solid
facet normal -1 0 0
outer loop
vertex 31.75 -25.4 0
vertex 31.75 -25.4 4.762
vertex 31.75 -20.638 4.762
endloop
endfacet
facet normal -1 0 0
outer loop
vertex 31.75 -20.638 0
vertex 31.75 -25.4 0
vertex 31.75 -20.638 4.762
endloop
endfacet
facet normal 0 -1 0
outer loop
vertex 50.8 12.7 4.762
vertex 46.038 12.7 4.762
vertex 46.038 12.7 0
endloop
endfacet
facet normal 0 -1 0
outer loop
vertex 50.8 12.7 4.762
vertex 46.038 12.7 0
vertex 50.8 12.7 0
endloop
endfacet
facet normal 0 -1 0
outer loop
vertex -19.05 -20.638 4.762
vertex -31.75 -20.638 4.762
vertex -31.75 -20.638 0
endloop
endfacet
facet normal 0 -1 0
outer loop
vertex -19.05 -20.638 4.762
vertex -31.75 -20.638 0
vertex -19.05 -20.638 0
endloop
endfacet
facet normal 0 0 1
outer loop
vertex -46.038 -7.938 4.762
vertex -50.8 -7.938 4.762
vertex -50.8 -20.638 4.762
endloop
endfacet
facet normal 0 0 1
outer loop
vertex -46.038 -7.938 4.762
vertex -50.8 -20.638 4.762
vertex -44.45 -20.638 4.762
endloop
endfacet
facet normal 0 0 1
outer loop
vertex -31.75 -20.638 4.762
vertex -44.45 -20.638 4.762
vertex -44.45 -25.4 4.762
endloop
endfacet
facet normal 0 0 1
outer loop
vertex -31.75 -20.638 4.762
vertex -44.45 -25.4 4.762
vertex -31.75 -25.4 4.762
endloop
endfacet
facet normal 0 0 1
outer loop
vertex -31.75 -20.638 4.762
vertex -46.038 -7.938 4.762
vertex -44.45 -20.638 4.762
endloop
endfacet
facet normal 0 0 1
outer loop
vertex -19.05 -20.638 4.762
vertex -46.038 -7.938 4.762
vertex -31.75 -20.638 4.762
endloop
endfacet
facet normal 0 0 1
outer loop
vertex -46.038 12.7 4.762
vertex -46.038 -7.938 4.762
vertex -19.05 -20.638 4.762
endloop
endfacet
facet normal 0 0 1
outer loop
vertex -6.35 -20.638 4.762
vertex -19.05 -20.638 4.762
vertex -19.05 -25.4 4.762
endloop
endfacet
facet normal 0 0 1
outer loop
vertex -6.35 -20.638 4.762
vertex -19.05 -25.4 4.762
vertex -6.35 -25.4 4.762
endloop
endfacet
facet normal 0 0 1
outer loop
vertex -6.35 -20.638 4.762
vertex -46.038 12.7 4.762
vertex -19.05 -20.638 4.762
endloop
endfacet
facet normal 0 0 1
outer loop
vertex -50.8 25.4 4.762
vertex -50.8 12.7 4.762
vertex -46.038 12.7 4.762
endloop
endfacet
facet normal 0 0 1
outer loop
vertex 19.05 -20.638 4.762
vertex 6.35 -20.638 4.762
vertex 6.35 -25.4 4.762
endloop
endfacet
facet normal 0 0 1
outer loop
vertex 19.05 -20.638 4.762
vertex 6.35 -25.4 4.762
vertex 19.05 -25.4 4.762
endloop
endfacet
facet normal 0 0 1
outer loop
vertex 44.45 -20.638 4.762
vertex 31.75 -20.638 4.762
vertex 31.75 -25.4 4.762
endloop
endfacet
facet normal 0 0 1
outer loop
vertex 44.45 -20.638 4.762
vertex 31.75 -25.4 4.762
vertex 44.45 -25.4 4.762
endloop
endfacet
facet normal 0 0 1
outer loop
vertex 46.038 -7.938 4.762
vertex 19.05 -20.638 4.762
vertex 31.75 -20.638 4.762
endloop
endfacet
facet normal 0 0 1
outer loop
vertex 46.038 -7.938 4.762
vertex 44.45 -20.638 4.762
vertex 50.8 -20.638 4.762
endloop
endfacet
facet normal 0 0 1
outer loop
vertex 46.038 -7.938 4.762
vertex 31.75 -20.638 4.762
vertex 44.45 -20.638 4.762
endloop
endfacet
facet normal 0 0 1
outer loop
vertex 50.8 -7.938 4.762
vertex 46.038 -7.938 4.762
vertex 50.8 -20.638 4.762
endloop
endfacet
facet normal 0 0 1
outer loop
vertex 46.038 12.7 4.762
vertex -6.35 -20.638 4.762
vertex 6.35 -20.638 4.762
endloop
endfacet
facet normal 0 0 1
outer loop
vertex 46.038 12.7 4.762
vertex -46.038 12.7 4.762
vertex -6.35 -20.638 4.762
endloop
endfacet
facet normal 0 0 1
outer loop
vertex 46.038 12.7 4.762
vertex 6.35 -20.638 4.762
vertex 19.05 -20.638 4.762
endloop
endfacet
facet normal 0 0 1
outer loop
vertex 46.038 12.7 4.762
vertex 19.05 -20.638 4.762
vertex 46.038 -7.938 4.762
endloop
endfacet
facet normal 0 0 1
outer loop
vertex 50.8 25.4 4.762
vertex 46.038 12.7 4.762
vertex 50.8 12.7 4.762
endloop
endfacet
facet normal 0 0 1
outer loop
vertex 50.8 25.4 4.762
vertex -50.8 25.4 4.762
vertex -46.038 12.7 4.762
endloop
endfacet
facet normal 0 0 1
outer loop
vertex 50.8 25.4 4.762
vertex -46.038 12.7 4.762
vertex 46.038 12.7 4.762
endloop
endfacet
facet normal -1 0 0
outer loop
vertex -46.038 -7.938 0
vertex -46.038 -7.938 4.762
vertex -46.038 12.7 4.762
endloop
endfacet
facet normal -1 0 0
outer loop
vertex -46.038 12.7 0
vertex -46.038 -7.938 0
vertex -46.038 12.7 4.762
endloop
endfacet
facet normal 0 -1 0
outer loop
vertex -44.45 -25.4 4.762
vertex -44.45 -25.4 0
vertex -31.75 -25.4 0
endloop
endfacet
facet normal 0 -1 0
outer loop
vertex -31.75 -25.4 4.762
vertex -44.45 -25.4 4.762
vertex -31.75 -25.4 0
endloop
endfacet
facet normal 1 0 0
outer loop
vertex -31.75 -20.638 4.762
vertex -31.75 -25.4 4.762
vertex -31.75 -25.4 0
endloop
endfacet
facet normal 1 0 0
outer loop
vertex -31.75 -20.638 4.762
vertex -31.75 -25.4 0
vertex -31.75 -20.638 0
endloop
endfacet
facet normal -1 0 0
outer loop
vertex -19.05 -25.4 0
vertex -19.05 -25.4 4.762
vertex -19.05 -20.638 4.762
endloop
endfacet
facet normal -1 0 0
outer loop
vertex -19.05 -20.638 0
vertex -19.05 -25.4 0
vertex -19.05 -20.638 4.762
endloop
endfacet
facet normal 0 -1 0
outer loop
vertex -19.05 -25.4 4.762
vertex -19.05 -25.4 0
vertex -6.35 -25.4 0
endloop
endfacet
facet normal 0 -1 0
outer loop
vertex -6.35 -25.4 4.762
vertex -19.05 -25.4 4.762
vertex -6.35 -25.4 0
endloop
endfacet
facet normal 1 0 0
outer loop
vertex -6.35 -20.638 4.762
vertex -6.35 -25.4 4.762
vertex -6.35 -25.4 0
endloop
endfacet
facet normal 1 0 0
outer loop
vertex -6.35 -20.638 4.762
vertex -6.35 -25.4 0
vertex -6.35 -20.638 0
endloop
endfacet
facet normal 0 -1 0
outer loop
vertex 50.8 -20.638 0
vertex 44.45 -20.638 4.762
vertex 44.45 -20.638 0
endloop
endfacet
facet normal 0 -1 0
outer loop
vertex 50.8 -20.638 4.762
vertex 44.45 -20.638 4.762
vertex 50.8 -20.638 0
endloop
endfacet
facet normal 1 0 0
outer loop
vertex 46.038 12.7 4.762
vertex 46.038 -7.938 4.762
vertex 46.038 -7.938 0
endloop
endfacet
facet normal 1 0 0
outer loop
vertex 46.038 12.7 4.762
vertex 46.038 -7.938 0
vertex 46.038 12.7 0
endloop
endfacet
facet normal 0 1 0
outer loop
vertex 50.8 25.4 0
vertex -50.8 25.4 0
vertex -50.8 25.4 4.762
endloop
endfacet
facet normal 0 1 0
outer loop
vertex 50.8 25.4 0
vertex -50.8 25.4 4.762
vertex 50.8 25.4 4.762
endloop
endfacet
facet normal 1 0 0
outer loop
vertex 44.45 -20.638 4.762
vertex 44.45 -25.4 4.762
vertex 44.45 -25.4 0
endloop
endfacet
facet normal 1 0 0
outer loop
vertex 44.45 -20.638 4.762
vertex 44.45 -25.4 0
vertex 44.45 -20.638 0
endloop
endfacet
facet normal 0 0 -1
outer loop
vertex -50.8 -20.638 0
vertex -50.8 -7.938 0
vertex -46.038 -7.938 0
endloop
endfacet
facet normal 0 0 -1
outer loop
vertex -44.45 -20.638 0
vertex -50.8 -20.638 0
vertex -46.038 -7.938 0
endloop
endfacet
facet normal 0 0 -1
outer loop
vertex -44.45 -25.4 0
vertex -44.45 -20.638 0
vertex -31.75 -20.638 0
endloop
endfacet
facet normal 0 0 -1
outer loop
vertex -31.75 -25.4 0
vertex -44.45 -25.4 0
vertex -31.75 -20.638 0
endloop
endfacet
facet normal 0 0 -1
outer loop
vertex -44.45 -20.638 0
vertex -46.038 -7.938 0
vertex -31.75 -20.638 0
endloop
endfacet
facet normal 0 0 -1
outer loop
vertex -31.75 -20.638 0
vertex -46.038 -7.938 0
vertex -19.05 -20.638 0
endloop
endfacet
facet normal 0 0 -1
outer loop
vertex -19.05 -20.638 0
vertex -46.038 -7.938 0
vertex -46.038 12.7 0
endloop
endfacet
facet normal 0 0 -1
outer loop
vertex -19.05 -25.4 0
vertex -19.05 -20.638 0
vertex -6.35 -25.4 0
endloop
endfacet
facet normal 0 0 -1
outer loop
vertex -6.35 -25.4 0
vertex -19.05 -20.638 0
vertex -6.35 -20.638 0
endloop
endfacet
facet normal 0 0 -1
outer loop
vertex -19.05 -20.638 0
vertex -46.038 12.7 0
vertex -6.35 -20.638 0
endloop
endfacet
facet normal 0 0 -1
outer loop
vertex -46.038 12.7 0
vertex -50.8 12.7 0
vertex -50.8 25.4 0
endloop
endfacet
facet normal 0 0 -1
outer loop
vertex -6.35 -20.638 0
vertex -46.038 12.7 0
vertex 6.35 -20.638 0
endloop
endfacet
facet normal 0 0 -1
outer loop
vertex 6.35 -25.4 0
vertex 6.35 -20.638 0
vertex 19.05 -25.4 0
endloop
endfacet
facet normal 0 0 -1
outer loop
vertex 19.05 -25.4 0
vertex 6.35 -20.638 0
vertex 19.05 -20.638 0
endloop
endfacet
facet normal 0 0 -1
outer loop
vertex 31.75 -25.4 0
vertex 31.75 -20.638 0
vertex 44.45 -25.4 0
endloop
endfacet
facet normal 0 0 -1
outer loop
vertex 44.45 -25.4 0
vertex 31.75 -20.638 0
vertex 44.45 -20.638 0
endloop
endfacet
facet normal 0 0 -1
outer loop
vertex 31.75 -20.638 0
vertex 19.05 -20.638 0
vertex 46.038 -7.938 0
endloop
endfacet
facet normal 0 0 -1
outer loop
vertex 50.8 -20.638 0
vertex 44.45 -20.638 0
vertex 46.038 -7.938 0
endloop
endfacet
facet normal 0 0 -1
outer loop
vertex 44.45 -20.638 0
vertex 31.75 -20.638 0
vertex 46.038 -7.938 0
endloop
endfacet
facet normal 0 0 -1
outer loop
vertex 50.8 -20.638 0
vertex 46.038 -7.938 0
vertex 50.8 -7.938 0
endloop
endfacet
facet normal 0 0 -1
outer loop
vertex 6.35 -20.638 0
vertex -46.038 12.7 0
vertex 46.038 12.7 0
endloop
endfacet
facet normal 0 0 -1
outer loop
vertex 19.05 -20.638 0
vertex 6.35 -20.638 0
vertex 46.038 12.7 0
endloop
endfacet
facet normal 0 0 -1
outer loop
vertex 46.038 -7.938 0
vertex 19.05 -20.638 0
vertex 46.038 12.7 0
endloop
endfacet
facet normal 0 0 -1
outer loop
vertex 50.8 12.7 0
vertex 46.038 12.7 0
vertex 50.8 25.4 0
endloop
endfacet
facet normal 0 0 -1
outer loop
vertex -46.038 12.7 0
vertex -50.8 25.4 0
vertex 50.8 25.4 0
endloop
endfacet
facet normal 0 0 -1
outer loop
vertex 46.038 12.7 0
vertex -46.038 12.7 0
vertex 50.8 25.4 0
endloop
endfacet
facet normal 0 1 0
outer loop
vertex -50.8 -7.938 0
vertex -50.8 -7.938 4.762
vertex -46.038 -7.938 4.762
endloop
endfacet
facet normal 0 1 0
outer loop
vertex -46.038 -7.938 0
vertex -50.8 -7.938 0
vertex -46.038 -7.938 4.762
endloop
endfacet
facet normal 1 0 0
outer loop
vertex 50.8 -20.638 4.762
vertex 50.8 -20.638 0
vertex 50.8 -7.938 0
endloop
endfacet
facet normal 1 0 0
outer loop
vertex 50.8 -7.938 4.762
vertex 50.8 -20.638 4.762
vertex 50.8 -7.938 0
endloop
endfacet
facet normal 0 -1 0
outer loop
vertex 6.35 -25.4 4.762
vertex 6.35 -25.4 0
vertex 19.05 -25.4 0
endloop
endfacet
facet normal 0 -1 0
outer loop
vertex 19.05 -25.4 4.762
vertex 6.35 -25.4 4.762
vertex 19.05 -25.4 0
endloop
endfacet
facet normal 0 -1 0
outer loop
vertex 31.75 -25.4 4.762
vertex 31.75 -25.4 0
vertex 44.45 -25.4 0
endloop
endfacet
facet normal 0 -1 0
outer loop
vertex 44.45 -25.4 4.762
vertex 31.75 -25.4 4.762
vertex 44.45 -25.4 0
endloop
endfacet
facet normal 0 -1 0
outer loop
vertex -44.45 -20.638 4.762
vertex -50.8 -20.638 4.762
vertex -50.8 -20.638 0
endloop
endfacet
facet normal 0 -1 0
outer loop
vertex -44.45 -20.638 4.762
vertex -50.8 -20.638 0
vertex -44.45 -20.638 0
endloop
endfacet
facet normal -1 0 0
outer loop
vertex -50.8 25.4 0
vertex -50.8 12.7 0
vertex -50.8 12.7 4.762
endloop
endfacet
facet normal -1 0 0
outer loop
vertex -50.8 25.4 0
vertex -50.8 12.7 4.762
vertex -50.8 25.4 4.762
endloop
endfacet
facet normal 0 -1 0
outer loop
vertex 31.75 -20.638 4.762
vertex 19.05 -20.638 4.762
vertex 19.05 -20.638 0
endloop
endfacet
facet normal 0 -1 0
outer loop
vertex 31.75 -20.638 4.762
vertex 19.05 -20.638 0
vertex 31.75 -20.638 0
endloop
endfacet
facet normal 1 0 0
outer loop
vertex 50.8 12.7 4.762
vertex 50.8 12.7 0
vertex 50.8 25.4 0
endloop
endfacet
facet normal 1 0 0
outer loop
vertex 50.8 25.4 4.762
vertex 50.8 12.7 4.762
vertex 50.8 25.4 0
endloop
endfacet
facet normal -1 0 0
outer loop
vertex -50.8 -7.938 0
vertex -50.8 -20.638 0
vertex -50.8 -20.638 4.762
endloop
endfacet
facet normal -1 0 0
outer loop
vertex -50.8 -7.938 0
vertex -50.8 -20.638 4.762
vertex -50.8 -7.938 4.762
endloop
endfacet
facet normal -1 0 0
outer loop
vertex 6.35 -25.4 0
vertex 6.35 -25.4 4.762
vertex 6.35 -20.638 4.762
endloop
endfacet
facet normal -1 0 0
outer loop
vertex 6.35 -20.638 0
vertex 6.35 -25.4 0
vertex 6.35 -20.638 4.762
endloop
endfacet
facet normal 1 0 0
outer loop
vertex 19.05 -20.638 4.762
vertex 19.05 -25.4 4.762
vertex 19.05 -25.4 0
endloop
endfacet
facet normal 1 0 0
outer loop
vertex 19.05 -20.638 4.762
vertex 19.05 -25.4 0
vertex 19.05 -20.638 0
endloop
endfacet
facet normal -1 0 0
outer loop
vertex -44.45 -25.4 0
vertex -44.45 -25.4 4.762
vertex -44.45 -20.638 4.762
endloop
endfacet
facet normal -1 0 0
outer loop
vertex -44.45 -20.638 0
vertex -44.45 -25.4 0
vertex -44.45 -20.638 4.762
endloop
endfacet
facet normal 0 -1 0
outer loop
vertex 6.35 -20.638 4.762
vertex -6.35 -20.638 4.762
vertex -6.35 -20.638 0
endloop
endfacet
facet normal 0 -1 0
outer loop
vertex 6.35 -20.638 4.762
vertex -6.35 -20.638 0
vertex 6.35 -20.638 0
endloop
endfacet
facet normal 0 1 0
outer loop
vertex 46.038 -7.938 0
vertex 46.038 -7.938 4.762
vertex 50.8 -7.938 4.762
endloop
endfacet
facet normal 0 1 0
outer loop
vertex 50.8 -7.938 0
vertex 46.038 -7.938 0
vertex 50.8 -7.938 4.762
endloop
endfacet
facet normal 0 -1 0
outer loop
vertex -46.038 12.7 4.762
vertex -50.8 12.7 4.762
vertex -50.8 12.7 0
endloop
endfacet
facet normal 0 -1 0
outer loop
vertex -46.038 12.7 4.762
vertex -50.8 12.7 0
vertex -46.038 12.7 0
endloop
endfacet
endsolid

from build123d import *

# Parameters (mm, degrees)
F0_W     = 101.6
F0_H     = 50.8
F1_DEPTH = 4.7625
F2_W     = 6.35
F2_H     = 4.7625
F2_W_2   = 12.7
F3_DEPTH = 25.4
F4_W     = 4.7625
F4_H     = 20.6375
F5_DEPTH = 25.4


with BuildPart() as f1:
    # F0 (on Top) → F1 (new body)
    with BuildSketch(Plane.XY):
        Rectangle(F0_W, F0_H)
    extrude(amount=F1_DEPTH)

    # F2 (on face) → F3 (cut)
    with BuildSketch(Plane.XY.offset(4.7625)):
        with Locations((-47.625, -23.01875)):
            Rectangle(F2_W, F2_H)
        with Locations((-25.4, -23.01875)):
            Rectangle(F2_W_2, F2_H)
        with Locations((0, -23.01875)):
            Rectangle(F2_W_2, F2_H)
        with Locations((25.4, -23.01875)):
            Rectangle(F2_W_2, F2_H)
        with Locations((47.625, -23.01875)):
            Rectangle(F2_W, F2_H)
    extrude(amount=-F3_DEPTH, mode=Mode.SUBTRACT)

    # F4 (on face) → F5 (cut)
    with BuildSketch(Plane.XY.offset(4.7625)):
        with Locations((-48.41875, 2.38125)):
            Rectangle(F4_W, F4_H)
        with Locations((48.41875, 2.38125)):
            Rectangle(F4_W, F4_H)
    extrude(amount=-F5_DEPTH, mode=Mode.SUBTRACT)


solid = f1.part
